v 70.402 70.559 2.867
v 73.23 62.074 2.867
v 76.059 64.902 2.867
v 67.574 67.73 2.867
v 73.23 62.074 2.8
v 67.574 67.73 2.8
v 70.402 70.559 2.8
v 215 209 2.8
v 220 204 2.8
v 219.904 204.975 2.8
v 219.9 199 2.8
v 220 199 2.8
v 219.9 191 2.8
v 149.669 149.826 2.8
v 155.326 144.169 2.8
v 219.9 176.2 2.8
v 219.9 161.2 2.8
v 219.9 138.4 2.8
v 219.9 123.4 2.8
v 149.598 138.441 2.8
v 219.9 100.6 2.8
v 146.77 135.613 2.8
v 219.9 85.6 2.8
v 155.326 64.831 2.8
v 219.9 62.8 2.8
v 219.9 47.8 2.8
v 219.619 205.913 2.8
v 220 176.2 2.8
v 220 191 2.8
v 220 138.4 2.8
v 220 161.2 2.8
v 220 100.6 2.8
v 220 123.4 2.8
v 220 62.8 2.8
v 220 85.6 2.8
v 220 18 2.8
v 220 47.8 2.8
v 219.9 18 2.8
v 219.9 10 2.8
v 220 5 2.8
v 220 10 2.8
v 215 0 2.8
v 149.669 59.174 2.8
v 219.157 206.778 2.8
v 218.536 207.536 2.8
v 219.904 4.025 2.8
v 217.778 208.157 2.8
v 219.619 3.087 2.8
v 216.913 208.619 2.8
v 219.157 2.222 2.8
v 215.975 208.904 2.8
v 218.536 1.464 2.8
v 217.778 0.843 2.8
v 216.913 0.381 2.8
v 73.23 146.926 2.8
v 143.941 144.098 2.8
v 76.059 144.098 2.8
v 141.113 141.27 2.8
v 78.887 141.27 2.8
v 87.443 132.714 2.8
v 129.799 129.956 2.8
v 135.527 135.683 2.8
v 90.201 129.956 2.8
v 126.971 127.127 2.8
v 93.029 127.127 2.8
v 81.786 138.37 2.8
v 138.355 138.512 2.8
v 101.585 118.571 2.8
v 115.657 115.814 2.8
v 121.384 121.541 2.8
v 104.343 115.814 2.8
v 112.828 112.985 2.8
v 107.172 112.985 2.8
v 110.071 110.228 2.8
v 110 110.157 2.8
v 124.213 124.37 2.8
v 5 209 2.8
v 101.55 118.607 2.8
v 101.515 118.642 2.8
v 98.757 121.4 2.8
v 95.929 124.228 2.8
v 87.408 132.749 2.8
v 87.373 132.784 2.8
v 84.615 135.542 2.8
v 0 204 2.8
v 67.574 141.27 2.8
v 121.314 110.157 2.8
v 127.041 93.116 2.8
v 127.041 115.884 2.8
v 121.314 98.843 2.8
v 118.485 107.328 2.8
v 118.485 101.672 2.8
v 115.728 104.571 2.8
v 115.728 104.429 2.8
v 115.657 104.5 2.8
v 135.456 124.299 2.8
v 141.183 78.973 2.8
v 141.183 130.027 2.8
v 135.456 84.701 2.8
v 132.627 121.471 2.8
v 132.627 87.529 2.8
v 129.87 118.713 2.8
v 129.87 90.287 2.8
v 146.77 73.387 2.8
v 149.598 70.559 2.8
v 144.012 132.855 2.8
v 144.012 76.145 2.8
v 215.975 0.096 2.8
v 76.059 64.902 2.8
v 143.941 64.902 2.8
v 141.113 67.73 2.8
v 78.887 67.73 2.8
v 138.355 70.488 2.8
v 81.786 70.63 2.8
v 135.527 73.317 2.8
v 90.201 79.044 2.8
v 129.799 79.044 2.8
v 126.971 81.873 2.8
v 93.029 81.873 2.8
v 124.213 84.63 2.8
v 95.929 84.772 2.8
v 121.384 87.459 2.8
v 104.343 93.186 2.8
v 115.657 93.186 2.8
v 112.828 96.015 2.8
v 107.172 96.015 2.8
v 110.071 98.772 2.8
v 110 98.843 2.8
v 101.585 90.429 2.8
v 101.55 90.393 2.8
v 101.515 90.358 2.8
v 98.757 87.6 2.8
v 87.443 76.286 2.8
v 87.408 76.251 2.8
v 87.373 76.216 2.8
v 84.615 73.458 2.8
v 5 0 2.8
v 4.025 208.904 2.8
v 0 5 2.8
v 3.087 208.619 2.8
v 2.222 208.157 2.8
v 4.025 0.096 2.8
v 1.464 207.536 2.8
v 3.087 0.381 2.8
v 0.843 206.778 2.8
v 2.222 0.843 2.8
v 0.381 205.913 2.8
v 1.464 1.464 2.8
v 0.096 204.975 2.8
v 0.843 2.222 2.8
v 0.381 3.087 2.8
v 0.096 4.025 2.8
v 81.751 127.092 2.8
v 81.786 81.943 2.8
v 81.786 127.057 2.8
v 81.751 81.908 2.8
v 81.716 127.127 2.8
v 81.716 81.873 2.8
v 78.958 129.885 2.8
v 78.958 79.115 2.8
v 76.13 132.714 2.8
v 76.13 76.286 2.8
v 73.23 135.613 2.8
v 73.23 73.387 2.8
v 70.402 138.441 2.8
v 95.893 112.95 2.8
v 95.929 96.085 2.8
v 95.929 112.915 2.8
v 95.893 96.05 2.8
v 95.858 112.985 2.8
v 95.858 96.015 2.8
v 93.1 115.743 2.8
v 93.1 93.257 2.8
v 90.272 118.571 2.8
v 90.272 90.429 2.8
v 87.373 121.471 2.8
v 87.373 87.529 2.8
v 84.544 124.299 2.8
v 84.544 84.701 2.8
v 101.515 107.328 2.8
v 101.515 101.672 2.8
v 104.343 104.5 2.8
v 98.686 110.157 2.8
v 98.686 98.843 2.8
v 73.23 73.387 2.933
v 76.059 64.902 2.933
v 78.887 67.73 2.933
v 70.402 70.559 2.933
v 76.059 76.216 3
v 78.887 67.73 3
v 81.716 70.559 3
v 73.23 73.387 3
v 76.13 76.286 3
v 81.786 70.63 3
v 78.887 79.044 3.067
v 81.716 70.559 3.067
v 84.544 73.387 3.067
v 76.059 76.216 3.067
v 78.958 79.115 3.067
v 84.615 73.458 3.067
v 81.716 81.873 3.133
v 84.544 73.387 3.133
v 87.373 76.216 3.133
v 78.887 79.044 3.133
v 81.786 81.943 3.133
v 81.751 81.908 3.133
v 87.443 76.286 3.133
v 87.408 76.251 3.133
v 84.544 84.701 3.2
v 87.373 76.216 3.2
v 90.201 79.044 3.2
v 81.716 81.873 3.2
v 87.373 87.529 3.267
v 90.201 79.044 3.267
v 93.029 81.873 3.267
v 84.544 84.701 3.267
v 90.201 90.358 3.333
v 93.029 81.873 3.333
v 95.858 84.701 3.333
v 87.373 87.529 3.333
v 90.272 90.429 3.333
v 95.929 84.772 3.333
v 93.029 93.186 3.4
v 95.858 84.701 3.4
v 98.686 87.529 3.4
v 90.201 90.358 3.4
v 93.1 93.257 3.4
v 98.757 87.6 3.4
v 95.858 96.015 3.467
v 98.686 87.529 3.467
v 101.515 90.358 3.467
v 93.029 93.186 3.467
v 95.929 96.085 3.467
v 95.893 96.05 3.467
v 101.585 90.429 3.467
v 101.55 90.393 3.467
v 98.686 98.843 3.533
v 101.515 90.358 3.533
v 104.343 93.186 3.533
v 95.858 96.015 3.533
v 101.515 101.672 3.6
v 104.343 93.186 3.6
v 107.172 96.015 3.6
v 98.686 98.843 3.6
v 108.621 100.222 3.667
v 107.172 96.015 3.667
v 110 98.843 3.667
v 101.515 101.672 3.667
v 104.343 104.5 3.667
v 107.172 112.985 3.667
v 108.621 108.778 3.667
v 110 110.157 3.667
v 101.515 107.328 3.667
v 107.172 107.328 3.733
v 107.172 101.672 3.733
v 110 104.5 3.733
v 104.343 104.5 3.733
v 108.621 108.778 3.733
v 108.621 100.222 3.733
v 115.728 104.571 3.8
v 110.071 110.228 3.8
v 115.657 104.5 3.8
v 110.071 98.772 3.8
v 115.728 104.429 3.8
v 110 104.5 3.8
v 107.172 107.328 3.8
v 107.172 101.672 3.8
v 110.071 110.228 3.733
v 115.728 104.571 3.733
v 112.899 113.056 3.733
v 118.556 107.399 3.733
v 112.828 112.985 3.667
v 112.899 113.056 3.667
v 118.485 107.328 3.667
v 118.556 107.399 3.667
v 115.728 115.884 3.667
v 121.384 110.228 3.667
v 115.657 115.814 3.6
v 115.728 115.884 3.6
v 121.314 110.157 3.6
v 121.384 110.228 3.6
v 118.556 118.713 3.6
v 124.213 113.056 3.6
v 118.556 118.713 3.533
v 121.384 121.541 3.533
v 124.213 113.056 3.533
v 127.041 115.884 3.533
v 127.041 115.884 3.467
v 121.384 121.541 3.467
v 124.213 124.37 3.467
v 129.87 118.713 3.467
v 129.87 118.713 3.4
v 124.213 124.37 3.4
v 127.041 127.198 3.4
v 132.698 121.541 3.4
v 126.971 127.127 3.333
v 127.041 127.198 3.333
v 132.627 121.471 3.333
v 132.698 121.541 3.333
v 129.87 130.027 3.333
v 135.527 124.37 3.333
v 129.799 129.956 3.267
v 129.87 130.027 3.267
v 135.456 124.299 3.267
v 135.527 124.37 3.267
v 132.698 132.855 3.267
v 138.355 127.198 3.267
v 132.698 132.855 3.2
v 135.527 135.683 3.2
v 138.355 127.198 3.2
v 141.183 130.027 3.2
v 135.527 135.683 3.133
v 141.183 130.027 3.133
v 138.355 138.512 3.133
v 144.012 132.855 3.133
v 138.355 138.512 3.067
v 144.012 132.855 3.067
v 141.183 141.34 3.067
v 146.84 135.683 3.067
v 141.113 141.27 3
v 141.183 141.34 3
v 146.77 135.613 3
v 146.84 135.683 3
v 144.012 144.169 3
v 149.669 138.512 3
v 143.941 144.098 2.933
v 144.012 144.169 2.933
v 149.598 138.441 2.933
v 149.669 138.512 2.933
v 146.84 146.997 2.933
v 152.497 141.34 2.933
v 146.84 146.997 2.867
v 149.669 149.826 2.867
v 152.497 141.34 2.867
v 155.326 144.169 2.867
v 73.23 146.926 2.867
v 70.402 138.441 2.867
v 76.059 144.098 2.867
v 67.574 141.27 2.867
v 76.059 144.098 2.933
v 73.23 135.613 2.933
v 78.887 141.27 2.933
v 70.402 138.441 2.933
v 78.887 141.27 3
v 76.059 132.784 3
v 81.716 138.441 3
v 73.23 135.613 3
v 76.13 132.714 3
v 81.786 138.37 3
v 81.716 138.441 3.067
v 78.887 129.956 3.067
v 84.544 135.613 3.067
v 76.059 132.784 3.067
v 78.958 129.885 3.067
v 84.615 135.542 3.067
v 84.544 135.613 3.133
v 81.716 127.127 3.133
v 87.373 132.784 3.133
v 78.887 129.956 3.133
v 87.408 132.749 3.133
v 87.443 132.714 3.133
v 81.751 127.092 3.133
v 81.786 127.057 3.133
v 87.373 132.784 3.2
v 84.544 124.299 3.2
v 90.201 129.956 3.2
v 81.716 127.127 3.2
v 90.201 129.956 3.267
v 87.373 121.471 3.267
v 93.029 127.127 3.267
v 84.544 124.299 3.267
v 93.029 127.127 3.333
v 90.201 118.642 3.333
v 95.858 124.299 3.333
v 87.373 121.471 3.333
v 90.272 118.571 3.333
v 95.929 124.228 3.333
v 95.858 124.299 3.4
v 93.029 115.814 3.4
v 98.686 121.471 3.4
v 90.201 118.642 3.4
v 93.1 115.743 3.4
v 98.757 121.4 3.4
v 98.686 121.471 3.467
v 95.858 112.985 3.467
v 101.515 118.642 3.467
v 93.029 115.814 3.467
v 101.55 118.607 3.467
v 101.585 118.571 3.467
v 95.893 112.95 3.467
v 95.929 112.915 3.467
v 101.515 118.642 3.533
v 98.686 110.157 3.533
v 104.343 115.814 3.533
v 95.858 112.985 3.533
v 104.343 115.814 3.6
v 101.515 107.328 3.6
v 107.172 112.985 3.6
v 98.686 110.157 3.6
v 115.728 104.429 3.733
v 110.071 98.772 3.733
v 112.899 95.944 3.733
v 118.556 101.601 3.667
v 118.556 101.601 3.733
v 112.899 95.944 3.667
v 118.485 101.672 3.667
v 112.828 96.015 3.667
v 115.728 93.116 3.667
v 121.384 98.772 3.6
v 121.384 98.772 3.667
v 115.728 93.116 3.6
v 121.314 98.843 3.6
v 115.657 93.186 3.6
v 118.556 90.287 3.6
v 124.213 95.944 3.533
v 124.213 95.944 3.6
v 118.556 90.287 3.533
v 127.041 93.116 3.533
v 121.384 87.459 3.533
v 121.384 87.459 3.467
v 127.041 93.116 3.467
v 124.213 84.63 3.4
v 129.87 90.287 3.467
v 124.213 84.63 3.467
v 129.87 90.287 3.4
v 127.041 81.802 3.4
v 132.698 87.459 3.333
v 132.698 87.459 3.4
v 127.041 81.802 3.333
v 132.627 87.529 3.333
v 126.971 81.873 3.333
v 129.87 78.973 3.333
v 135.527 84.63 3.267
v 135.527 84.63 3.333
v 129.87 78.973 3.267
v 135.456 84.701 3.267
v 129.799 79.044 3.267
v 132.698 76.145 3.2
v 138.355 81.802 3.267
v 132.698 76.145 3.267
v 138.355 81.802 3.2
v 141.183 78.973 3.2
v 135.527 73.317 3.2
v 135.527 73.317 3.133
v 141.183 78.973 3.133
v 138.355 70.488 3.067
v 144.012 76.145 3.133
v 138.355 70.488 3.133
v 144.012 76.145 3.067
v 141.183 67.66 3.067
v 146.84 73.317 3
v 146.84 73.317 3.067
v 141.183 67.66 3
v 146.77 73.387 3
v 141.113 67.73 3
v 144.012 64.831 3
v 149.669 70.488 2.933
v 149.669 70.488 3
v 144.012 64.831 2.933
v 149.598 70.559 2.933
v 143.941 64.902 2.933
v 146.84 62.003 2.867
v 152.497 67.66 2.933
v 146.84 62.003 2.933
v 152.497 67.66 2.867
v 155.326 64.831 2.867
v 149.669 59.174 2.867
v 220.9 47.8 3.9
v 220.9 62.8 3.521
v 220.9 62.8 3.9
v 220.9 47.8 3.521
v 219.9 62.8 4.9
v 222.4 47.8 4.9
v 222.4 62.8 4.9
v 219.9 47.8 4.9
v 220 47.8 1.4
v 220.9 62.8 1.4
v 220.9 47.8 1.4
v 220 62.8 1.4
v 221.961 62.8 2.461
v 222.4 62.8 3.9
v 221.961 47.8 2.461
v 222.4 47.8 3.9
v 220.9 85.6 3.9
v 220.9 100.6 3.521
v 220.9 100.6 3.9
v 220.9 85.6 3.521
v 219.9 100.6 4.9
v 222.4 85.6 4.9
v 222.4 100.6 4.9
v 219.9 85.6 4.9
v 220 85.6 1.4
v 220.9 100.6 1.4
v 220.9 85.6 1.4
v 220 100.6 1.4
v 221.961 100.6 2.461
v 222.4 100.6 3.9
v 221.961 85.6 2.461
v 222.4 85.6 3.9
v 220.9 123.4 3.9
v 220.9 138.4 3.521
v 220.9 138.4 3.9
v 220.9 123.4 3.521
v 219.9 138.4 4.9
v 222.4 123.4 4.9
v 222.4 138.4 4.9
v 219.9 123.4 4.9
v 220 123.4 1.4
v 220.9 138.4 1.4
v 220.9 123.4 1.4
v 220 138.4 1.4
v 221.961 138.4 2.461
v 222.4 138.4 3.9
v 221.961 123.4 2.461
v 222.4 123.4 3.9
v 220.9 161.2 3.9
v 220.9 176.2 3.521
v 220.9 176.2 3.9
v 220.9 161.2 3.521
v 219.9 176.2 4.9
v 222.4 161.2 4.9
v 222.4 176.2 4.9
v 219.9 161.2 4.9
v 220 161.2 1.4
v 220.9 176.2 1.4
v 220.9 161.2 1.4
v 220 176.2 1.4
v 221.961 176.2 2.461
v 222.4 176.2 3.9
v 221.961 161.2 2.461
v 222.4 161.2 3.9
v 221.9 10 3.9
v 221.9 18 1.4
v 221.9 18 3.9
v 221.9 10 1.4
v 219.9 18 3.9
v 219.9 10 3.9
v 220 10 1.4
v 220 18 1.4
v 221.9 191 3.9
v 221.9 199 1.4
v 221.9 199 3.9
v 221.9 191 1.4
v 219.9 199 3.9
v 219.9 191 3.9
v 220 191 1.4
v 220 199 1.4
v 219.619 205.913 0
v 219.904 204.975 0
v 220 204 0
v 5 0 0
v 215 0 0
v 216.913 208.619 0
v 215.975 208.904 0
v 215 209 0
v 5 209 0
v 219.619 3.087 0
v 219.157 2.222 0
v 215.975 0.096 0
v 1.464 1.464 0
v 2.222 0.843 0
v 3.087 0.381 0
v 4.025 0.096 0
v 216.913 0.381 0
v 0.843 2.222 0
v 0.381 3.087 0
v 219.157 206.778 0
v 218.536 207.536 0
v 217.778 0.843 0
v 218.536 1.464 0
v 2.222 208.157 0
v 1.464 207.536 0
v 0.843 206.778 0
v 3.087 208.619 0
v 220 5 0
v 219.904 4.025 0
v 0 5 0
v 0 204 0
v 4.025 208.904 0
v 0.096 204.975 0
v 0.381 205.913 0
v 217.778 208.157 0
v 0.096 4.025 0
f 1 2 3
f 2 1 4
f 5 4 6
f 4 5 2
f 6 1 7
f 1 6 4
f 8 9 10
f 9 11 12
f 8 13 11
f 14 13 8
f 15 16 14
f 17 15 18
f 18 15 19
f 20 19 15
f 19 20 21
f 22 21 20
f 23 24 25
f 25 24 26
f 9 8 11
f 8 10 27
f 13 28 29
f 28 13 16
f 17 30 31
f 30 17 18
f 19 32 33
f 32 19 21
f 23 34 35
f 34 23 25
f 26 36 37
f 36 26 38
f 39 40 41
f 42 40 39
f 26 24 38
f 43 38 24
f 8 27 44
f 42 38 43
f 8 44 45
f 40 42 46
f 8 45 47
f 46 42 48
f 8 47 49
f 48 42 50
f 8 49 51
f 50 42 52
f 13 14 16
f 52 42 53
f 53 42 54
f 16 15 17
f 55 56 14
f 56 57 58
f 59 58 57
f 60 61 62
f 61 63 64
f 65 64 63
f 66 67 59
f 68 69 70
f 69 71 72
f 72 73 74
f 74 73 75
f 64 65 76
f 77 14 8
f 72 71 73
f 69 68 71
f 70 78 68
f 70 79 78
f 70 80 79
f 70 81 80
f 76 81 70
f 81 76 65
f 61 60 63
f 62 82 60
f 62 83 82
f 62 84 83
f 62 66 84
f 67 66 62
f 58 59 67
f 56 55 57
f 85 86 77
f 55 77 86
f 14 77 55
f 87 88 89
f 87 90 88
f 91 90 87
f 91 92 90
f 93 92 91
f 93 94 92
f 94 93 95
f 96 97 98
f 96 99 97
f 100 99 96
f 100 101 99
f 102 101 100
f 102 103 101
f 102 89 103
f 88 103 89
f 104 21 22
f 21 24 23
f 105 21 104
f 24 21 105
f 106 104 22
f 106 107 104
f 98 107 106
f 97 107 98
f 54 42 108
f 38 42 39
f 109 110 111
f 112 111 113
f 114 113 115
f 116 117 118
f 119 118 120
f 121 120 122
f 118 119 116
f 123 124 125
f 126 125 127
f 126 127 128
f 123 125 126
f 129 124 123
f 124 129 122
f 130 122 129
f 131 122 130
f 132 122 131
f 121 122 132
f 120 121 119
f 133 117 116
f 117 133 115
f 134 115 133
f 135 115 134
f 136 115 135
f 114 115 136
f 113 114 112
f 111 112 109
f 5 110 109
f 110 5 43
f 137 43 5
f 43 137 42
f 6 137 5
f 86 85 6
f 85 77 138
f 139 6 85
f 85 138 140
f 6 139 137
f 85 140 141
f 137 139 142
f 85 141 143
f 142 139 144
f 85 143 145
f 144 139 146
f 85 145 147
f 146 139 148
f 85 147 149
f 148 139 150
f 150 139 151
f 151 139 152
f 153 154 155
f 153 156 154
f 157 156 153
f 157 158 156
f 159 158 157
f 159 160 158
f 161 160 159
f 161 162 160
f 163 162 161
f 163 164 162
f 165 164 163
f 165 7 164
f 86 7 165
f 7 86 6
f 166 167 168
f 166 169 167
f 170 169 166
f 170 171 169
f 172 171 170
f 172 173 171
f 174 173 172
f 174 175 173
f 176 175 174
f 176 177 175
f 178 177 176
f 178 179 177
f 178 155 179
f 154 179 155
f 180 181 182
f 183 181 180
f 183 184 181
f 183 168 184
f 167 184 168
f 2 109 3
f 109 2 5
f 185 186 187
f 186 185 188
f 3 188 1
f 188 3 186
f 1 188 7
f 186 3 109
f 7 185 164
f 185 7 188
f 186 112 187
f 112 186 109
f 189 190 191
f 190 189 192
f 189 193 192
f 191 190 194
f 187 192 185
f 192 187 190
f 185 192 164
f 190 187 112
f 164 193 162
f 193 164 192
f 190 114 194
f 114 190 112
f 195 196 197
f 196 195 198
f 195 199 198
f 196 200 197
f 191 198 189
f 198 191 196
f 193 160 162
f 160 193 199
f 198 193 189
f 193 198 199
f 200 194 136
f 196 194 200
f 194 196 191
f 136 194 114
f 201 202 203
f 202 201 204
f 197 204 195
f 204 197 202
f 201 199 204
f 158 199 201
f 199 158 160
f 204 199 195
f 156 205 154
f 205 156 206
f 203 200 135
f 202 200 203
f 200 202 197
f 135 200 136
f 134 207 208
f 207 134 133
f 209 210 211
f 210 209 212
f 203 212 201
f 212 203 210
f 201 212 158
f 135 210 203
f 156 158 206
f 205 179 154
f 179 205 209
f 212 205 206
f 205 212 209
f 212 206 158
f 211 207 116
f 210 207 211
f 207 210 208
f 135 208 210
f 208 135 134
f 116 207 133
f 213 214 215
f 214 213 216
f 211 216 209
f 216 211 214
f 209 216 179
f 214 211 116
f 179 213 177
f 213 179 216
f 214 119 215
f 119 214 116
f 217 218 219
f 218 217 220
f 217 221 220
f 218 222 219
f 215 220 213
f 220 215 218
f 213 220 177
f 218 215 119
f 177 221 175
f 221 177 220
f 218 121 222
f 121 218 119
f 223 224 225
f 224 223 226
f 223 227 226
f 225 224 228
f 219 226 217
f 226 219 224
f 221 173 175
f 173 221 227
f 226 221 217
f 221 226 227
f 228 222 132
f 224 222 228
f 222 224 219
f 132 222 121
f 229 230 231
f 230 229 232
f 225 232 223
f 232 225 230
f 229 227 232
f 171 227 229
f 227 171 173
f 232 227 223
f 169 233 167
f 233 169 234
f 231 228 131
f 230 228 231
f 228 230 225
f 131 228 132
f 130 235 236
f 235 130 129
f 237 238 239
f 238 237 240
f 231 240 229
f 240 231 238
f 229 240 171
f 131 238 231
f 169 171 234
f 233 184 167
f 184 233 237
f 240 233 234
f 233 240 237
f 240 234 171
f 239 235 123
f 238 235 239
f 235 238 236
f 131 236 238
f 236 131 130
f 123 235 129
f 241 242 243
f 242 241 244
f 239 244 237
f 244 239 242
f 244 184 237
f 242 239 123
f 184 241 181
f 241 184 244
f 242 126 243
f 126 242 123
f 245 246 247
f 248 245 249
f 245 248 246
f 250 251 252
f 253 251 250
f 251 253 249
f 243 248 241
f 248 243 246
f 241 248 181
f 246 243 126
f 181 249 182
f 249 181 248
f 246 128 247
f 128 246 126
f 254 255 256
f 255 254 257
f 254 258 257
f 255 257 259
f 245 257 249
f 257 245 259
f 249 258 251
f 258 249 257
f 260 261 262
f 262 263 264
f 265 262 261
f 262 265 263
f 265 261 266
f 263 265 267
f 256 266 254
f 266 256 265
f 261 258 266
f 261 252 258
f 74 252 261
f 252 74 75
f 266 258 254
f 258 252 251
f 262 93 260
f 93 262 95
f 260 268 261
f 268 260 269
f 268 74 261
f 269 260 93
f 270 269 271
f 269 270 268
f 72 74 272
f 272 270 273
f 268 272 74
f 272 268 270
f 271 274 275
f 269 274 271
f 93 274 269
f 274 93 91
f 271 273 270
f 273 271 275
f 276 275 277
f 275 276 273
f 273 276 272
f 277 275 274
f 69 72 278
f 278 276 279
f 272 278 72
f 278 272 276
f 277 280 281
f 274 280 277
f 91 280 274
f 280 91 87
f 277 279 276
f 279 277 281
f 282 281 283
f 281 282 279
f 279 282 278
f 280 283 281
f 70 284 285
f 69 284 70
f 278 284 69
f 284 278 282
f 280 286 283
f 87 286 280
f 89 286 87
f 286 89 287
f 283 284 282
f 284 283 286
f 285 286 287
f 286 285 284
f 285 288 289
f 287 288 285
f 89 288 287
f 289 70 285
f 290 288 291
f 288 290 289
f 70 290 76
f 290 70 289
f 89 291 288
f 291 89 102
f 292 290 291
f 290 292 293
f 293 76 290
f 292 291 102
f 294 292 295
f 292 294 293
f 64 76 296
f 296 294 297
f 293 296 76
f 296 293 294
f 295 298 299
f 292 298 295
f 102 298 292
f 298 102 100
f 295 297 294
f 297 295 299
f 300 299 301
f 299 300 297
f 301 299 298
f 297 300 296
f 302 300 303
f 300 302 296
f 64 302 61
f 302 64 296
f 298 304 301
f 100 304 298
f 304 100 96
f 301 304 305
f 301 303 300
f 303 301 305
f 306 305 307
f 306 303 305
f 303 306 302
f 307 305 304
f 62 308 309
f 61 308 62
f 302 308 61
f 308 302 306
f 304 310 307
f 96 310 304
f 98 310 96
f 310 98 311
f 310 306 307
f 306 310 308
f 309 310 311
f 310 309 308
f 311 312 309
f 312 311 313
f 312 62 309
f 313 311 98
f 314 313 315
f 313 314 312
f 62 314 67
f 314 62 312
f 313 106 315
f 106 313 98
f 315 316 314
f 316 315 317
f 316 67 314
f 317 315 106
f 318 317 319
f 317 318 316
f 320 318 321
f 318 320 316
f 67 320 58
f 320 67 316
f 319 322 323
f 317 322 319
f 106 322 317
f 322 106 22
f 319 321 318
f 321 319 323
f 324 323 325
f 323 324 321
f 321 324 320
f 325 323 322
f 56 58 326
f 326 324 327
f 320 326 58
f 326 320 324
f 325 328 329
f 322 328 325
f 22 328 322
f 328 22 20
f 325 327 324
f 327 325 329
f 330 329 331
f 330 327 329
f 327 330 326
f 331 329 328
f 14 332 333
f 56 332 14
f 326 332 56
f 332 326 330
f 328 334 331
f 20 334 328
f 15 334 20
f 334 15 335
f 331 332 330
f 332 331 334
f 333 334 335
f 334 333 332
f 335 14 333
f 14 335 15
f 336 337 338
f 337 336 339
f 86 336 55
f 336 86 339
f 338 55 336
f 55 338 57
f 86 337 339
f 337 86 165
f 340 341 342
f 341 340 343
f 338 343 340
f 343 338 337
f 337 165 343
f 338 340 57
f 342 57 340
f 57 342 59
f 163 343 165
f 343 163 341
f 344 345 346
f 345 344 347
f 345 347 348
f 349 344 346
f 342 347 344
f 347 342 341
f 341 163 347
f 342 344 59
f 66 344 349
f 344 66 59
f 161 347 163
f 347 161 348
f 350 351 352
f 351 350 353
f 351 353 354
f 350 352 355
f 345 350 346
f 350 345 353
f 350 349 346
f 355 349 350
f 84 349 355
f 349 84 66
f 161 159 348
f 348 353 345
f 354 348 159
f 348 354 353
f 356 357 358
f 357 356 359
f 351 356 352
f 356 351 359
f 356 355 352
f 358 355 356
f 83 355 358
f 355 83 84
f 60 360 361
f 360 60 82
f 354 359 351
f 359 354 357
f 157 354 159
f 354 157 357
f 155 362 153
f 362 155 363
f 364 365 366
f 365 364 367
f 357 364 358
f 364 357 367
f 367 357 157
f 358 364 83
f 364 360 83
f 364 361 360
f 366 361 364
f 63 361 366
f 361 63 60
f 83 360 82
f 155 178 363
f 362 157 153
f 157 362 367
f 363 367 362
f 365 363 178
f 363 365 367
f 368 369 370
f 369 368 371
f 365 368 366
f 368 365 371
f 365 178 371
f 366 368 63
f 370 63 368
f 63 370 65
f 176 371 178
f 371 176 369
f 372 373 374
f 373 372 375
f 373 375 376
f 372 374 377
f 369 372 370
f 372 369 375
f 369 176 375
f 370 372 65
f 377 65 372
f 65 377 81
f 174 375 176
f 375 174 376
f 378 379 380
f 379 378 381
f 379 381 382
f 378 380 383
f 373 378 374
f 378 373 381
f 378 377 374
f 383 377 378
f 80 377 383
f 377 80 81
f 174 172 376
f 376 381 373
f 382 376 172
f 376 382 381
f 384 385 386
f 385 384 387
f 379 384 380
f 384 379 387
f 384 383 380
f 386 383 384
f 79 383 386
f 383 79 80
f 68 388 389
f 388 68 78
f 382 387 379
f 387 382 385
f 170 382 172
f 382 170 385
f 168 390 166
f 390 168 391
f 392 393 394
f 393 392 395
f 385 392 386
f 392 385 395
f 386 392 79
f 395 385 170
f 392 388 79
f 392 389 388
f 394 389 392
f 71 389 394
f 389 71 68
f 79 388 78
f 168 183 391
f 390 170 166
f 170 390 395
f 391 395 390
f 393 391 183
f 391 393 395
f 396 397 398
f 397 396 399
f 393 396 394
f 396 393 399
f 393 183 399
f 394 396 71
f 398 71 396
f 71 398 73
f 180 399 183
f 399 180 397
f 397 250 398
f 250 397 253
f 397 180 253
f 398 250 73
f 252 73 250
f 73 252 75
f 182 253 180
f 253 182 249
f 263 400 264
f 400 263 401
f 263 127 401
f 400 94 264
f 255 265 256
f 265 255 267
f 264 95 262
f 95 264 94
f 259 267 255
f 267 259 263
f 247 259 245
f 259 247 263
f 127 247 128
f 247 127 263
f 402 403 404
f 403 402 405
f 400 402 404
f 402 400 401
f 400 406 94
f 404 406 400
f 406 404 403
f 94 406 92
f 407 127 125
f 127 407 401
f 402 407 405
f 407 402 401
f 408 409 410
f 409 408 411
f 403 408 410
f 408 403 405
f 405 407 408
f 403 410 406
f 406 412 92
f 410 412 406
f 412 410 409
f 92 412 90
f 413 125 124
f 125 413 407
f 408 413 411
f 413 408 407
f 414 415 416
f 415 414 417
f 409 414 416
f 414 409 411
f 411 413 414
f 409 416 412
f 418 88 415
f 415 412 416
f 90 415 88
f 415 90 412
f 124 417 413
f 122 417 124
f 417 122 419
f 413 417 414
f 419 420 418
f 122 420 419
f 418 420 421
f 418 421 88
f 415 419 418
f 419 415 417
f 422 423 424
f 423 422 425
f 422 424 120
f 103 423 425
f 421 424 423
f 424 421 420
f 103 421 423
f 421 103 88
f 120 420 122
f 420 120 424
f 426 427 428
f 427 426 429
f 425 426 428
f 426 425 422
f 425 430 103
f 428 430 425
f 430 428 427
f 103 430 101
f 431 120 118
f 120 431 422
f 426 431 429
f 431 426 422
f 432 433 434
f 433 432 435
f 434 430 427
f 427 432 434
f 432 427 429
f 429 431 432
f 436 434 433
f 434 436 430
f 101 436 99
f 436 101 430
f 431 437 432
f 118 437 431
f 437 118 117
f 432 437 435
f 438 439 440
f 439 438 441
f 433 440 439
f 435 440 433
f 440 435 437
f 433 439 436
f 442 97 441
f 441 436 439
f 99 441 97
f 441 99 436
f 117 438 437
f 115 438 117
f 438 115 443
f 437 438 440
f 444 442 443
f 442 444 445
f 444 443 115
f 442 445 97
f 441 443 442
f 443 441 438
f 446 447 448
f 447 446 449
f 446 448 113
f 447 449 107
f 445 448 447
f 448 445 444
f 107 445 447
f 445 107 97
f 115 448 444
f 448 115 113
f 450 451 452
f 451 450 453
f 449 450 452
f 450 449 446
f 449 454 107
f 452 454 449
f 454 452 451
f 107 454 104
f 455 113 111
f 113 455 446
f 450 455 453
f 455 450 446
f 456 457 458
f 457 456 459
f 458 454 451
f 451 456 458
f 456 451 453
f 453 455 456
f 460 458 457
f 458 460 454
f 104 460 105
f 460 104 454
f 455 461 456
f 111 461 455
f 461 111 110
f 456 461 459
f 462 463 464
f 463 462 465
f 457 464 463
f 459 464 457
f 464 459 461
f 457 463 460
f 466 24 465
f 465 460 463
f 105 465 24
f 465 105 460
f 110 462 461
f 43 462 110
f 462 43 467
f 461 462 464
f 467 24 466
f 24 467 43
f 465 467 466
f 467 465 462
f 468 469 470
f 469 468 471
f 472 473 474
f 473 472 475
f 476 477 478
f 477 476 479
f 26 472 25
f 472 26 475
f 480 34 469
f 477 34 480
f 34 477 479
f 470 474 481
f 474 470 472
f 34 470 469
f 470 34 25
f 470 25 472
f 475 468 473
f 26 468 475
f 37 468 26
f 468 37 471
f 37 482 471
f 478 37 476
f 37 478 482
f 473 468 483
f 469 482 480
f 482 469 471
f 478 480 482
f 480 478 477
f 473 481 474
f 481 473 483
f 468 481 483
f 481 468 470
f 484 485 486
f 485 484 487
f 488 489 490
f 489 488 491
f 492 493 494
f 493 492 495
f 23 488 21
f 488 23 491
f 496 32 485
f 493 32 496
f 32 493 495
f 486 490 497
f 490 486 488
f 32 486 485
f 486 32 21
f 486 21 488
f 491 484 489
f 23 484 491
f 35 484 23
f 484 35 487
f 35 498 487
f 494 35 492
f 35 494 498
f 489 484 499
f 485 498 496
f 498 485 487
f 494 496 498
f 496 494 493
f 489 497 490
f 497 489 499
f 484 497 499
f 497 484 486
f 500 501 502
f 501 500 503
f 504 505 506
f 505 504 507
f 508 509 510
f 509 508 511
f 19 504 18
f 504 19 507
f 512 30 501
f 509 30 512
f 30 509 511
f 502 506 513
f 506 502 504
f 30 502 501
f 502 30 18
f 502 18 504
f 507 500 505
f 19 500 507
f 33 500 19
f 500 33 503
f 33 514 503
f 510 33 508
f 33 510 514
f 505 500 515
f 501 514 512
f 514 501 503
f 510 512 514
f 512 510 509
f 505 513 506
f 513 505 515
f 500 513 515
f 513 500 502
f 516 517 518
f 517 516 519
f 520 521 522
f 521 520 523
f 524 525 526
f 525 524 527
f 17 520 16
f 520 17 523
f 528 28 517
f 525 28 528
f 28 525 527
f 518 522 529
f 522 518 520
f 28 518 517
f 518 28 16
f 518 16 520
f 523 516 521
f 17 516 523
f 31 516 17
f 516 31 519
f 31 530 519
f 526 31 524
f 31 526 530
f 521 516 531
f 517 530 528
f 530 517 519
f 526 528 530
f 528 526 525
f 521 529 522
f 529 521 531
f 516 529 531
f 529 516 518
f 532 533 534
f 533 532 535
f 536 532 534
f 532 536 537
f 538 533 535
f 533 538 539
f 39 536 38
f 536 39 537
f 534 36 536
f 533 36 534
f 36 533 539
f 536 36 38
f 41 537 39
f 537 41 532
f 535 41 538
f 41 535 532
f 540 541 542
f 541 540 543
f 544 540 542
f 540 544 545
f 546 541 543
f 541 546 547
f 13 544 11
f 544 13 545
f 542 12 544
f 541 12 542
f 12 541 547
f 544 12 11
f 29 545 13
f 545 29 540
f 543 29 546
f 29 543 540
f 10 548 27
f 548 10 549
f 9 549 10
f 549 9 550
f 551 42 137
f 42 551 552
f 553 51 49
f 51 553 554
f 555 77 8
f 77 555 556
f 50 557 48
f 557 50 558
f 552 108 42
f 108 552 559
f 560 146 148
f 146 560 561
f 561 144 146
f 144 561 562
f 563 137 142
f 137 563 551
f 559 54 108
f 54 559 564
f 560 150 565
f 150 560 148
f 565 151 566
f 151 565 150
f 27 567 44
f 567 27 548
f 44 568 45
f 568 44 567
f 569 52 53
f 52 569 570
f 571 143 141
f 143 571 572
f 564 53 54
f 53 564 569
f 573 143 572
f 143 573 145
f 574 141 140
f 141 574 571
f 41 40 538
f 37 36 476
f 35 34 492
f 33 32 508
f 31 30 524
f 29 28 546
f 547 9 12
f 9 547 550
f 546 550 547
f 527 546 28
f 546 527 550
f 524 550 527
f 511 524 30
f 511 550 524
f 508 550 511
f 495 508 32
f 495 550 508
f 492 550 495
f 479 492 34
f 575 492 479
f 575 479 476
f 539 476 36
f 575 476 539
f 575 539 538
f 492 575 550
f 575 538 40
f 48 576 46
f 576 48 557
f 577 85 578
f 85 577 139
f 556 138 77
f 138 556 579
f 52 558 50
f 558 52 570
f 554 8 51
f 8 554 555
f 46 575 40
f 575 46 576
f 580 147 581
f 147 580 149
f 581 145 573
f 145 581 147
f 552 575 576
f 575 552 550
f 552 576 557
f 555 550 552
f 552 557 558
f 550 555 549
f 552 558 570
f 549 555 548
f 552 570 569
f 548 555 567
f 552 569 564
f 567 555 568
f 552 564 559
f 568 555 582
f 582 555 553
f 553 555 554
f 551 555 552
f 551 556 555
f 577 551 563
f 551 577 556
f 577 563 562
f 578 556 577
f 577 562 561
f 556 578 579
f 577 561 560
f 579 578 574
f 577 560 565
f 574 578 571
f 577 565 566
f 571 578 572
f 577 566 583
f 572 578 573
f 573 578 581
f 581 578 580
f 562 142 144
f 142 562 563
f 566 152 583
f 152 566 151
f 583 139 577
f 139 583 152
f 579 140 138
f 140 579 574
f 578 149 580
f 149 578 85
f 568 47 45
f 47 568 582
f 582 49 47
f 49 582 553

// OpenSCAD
// 机箱前面板 - A块 (220mm × 209mm × 2.8mm)
// 带卡扣拼接结构 (凸扣)

// 参数
width = 220;     // 宽度 (mm)
height = 209;    // 高度 (mm)
thickness = 2.8; // 厚度 (mm)
corner_radius = 5;  // 倒角半径 (mm)

// 卡扣参数
tab_width = 15;      // 卡扣宽度 (mm)
tab_height = 3.5;    // 卡扣高度 (mm)
tab_depth = 1.0;     // 卡扣凸出深度 (mm)
tab_count = 4;       // 卡扣数量
tab_spacing = (height - 20) / (tab_count + 1);  // 卡扣间距

// X 图案参数 (原参数保持不变)
x_max_height = 1.0;
x_width = 8;
x_diagonal = 120;

// 圆角矩形模块
module rounded_rect(w, h, r, t) {
    hull() {
        translate([r, r, 0]) cylinder(h = t, r = r, $fn = 32);
        translate([w - r, r, 0]) cylinder(h = t, r = r, $fn = 32);
        translate([w - r, h - r, 0]) cylinder(h = t, r = r, $fn = 32);
        translate([r, h - r, 0]) cylinder(h = t, r = r, $fn = 32);
    }
}

// 凸卡扣模块 (在右侧边缘)
module tab_protrusion(y_pos) {
    translate([width - 0.1, y_pos, thickness/2])
    union() {
        // 卡扣主体
        translate([0, 0, 0])
        cube([tab_depth, tab_width, tab_height]);

        // 导入斜坡 (便于卡入)
        translate([tab_depth, 0, 0])
        rotate([0, -45, 0])
        cube([1.5, tab_width, 1.5]);

        // 卡勾 (防止脱出)
        translate([tab_depth, 0, tab_height - 1])
        cube([1.5, tab_width, 1]);
    }
}

// 定位凸起 (防止上下滑动)
module alignment_protrusion() {
    translate([width - 0.1, 10, thickness/2])
    cube([2, 8, 2.5]);

    translate([width - 0.1, height - 18, thickness/2])
    cube([2, 8, 2.5]);
}

// 创建主体
difference() {
    union() {
        // 前面板主体
        color("LightGray") {
            rounded_rect(width, height, corner_radius, thickness);
        }

        // X 图案 (在面板中心)
        translate([width/2, height/2, 0])
        x_pattern_scaled();

        // 卡扣凸起
        color("DarkGray") {
            for (i = [0:tab_count-1]) {
                tab_protrusion(10 + (i + 1) * tab_spacing);
            }
        }

        // 定位凸起
        alignment_protrusion();
    }
}

// 缩放后的X图案 (适配A块尺寸)
module x_pattern_scaled() {
    segments = 30;
    segment_length = x_diagonal / segments;

    union() {
        // 第一条对角线
        for (i = [-segments/2:segments/2-1]) {
            dist_ratio = abs(i) / (segments/2);
            current_height = x_max_height * (1 - dist_ratio);

            translate([0, 0, thickness])
            rotate([0, 0, 45])
            translate([i * segment_length, -x_width/2, 0])
            cube([segment_length + 0.1, x_width, current_height]);
        }

        // 第二条对角线
        for (i = [-segments/2:segments/2-1]) {
            dist_ratio = abs(i) / (segments/2);
            current_height = x_max_height * (1 - dist_ratio);

            translate([0, 0, thickness])
            rotate([0, 0, -45])
            translate([i * segment_length, -x_width/2, 0])
            cube([segment_length + 0.1, x_width, current_height]);
        }
    }
}
